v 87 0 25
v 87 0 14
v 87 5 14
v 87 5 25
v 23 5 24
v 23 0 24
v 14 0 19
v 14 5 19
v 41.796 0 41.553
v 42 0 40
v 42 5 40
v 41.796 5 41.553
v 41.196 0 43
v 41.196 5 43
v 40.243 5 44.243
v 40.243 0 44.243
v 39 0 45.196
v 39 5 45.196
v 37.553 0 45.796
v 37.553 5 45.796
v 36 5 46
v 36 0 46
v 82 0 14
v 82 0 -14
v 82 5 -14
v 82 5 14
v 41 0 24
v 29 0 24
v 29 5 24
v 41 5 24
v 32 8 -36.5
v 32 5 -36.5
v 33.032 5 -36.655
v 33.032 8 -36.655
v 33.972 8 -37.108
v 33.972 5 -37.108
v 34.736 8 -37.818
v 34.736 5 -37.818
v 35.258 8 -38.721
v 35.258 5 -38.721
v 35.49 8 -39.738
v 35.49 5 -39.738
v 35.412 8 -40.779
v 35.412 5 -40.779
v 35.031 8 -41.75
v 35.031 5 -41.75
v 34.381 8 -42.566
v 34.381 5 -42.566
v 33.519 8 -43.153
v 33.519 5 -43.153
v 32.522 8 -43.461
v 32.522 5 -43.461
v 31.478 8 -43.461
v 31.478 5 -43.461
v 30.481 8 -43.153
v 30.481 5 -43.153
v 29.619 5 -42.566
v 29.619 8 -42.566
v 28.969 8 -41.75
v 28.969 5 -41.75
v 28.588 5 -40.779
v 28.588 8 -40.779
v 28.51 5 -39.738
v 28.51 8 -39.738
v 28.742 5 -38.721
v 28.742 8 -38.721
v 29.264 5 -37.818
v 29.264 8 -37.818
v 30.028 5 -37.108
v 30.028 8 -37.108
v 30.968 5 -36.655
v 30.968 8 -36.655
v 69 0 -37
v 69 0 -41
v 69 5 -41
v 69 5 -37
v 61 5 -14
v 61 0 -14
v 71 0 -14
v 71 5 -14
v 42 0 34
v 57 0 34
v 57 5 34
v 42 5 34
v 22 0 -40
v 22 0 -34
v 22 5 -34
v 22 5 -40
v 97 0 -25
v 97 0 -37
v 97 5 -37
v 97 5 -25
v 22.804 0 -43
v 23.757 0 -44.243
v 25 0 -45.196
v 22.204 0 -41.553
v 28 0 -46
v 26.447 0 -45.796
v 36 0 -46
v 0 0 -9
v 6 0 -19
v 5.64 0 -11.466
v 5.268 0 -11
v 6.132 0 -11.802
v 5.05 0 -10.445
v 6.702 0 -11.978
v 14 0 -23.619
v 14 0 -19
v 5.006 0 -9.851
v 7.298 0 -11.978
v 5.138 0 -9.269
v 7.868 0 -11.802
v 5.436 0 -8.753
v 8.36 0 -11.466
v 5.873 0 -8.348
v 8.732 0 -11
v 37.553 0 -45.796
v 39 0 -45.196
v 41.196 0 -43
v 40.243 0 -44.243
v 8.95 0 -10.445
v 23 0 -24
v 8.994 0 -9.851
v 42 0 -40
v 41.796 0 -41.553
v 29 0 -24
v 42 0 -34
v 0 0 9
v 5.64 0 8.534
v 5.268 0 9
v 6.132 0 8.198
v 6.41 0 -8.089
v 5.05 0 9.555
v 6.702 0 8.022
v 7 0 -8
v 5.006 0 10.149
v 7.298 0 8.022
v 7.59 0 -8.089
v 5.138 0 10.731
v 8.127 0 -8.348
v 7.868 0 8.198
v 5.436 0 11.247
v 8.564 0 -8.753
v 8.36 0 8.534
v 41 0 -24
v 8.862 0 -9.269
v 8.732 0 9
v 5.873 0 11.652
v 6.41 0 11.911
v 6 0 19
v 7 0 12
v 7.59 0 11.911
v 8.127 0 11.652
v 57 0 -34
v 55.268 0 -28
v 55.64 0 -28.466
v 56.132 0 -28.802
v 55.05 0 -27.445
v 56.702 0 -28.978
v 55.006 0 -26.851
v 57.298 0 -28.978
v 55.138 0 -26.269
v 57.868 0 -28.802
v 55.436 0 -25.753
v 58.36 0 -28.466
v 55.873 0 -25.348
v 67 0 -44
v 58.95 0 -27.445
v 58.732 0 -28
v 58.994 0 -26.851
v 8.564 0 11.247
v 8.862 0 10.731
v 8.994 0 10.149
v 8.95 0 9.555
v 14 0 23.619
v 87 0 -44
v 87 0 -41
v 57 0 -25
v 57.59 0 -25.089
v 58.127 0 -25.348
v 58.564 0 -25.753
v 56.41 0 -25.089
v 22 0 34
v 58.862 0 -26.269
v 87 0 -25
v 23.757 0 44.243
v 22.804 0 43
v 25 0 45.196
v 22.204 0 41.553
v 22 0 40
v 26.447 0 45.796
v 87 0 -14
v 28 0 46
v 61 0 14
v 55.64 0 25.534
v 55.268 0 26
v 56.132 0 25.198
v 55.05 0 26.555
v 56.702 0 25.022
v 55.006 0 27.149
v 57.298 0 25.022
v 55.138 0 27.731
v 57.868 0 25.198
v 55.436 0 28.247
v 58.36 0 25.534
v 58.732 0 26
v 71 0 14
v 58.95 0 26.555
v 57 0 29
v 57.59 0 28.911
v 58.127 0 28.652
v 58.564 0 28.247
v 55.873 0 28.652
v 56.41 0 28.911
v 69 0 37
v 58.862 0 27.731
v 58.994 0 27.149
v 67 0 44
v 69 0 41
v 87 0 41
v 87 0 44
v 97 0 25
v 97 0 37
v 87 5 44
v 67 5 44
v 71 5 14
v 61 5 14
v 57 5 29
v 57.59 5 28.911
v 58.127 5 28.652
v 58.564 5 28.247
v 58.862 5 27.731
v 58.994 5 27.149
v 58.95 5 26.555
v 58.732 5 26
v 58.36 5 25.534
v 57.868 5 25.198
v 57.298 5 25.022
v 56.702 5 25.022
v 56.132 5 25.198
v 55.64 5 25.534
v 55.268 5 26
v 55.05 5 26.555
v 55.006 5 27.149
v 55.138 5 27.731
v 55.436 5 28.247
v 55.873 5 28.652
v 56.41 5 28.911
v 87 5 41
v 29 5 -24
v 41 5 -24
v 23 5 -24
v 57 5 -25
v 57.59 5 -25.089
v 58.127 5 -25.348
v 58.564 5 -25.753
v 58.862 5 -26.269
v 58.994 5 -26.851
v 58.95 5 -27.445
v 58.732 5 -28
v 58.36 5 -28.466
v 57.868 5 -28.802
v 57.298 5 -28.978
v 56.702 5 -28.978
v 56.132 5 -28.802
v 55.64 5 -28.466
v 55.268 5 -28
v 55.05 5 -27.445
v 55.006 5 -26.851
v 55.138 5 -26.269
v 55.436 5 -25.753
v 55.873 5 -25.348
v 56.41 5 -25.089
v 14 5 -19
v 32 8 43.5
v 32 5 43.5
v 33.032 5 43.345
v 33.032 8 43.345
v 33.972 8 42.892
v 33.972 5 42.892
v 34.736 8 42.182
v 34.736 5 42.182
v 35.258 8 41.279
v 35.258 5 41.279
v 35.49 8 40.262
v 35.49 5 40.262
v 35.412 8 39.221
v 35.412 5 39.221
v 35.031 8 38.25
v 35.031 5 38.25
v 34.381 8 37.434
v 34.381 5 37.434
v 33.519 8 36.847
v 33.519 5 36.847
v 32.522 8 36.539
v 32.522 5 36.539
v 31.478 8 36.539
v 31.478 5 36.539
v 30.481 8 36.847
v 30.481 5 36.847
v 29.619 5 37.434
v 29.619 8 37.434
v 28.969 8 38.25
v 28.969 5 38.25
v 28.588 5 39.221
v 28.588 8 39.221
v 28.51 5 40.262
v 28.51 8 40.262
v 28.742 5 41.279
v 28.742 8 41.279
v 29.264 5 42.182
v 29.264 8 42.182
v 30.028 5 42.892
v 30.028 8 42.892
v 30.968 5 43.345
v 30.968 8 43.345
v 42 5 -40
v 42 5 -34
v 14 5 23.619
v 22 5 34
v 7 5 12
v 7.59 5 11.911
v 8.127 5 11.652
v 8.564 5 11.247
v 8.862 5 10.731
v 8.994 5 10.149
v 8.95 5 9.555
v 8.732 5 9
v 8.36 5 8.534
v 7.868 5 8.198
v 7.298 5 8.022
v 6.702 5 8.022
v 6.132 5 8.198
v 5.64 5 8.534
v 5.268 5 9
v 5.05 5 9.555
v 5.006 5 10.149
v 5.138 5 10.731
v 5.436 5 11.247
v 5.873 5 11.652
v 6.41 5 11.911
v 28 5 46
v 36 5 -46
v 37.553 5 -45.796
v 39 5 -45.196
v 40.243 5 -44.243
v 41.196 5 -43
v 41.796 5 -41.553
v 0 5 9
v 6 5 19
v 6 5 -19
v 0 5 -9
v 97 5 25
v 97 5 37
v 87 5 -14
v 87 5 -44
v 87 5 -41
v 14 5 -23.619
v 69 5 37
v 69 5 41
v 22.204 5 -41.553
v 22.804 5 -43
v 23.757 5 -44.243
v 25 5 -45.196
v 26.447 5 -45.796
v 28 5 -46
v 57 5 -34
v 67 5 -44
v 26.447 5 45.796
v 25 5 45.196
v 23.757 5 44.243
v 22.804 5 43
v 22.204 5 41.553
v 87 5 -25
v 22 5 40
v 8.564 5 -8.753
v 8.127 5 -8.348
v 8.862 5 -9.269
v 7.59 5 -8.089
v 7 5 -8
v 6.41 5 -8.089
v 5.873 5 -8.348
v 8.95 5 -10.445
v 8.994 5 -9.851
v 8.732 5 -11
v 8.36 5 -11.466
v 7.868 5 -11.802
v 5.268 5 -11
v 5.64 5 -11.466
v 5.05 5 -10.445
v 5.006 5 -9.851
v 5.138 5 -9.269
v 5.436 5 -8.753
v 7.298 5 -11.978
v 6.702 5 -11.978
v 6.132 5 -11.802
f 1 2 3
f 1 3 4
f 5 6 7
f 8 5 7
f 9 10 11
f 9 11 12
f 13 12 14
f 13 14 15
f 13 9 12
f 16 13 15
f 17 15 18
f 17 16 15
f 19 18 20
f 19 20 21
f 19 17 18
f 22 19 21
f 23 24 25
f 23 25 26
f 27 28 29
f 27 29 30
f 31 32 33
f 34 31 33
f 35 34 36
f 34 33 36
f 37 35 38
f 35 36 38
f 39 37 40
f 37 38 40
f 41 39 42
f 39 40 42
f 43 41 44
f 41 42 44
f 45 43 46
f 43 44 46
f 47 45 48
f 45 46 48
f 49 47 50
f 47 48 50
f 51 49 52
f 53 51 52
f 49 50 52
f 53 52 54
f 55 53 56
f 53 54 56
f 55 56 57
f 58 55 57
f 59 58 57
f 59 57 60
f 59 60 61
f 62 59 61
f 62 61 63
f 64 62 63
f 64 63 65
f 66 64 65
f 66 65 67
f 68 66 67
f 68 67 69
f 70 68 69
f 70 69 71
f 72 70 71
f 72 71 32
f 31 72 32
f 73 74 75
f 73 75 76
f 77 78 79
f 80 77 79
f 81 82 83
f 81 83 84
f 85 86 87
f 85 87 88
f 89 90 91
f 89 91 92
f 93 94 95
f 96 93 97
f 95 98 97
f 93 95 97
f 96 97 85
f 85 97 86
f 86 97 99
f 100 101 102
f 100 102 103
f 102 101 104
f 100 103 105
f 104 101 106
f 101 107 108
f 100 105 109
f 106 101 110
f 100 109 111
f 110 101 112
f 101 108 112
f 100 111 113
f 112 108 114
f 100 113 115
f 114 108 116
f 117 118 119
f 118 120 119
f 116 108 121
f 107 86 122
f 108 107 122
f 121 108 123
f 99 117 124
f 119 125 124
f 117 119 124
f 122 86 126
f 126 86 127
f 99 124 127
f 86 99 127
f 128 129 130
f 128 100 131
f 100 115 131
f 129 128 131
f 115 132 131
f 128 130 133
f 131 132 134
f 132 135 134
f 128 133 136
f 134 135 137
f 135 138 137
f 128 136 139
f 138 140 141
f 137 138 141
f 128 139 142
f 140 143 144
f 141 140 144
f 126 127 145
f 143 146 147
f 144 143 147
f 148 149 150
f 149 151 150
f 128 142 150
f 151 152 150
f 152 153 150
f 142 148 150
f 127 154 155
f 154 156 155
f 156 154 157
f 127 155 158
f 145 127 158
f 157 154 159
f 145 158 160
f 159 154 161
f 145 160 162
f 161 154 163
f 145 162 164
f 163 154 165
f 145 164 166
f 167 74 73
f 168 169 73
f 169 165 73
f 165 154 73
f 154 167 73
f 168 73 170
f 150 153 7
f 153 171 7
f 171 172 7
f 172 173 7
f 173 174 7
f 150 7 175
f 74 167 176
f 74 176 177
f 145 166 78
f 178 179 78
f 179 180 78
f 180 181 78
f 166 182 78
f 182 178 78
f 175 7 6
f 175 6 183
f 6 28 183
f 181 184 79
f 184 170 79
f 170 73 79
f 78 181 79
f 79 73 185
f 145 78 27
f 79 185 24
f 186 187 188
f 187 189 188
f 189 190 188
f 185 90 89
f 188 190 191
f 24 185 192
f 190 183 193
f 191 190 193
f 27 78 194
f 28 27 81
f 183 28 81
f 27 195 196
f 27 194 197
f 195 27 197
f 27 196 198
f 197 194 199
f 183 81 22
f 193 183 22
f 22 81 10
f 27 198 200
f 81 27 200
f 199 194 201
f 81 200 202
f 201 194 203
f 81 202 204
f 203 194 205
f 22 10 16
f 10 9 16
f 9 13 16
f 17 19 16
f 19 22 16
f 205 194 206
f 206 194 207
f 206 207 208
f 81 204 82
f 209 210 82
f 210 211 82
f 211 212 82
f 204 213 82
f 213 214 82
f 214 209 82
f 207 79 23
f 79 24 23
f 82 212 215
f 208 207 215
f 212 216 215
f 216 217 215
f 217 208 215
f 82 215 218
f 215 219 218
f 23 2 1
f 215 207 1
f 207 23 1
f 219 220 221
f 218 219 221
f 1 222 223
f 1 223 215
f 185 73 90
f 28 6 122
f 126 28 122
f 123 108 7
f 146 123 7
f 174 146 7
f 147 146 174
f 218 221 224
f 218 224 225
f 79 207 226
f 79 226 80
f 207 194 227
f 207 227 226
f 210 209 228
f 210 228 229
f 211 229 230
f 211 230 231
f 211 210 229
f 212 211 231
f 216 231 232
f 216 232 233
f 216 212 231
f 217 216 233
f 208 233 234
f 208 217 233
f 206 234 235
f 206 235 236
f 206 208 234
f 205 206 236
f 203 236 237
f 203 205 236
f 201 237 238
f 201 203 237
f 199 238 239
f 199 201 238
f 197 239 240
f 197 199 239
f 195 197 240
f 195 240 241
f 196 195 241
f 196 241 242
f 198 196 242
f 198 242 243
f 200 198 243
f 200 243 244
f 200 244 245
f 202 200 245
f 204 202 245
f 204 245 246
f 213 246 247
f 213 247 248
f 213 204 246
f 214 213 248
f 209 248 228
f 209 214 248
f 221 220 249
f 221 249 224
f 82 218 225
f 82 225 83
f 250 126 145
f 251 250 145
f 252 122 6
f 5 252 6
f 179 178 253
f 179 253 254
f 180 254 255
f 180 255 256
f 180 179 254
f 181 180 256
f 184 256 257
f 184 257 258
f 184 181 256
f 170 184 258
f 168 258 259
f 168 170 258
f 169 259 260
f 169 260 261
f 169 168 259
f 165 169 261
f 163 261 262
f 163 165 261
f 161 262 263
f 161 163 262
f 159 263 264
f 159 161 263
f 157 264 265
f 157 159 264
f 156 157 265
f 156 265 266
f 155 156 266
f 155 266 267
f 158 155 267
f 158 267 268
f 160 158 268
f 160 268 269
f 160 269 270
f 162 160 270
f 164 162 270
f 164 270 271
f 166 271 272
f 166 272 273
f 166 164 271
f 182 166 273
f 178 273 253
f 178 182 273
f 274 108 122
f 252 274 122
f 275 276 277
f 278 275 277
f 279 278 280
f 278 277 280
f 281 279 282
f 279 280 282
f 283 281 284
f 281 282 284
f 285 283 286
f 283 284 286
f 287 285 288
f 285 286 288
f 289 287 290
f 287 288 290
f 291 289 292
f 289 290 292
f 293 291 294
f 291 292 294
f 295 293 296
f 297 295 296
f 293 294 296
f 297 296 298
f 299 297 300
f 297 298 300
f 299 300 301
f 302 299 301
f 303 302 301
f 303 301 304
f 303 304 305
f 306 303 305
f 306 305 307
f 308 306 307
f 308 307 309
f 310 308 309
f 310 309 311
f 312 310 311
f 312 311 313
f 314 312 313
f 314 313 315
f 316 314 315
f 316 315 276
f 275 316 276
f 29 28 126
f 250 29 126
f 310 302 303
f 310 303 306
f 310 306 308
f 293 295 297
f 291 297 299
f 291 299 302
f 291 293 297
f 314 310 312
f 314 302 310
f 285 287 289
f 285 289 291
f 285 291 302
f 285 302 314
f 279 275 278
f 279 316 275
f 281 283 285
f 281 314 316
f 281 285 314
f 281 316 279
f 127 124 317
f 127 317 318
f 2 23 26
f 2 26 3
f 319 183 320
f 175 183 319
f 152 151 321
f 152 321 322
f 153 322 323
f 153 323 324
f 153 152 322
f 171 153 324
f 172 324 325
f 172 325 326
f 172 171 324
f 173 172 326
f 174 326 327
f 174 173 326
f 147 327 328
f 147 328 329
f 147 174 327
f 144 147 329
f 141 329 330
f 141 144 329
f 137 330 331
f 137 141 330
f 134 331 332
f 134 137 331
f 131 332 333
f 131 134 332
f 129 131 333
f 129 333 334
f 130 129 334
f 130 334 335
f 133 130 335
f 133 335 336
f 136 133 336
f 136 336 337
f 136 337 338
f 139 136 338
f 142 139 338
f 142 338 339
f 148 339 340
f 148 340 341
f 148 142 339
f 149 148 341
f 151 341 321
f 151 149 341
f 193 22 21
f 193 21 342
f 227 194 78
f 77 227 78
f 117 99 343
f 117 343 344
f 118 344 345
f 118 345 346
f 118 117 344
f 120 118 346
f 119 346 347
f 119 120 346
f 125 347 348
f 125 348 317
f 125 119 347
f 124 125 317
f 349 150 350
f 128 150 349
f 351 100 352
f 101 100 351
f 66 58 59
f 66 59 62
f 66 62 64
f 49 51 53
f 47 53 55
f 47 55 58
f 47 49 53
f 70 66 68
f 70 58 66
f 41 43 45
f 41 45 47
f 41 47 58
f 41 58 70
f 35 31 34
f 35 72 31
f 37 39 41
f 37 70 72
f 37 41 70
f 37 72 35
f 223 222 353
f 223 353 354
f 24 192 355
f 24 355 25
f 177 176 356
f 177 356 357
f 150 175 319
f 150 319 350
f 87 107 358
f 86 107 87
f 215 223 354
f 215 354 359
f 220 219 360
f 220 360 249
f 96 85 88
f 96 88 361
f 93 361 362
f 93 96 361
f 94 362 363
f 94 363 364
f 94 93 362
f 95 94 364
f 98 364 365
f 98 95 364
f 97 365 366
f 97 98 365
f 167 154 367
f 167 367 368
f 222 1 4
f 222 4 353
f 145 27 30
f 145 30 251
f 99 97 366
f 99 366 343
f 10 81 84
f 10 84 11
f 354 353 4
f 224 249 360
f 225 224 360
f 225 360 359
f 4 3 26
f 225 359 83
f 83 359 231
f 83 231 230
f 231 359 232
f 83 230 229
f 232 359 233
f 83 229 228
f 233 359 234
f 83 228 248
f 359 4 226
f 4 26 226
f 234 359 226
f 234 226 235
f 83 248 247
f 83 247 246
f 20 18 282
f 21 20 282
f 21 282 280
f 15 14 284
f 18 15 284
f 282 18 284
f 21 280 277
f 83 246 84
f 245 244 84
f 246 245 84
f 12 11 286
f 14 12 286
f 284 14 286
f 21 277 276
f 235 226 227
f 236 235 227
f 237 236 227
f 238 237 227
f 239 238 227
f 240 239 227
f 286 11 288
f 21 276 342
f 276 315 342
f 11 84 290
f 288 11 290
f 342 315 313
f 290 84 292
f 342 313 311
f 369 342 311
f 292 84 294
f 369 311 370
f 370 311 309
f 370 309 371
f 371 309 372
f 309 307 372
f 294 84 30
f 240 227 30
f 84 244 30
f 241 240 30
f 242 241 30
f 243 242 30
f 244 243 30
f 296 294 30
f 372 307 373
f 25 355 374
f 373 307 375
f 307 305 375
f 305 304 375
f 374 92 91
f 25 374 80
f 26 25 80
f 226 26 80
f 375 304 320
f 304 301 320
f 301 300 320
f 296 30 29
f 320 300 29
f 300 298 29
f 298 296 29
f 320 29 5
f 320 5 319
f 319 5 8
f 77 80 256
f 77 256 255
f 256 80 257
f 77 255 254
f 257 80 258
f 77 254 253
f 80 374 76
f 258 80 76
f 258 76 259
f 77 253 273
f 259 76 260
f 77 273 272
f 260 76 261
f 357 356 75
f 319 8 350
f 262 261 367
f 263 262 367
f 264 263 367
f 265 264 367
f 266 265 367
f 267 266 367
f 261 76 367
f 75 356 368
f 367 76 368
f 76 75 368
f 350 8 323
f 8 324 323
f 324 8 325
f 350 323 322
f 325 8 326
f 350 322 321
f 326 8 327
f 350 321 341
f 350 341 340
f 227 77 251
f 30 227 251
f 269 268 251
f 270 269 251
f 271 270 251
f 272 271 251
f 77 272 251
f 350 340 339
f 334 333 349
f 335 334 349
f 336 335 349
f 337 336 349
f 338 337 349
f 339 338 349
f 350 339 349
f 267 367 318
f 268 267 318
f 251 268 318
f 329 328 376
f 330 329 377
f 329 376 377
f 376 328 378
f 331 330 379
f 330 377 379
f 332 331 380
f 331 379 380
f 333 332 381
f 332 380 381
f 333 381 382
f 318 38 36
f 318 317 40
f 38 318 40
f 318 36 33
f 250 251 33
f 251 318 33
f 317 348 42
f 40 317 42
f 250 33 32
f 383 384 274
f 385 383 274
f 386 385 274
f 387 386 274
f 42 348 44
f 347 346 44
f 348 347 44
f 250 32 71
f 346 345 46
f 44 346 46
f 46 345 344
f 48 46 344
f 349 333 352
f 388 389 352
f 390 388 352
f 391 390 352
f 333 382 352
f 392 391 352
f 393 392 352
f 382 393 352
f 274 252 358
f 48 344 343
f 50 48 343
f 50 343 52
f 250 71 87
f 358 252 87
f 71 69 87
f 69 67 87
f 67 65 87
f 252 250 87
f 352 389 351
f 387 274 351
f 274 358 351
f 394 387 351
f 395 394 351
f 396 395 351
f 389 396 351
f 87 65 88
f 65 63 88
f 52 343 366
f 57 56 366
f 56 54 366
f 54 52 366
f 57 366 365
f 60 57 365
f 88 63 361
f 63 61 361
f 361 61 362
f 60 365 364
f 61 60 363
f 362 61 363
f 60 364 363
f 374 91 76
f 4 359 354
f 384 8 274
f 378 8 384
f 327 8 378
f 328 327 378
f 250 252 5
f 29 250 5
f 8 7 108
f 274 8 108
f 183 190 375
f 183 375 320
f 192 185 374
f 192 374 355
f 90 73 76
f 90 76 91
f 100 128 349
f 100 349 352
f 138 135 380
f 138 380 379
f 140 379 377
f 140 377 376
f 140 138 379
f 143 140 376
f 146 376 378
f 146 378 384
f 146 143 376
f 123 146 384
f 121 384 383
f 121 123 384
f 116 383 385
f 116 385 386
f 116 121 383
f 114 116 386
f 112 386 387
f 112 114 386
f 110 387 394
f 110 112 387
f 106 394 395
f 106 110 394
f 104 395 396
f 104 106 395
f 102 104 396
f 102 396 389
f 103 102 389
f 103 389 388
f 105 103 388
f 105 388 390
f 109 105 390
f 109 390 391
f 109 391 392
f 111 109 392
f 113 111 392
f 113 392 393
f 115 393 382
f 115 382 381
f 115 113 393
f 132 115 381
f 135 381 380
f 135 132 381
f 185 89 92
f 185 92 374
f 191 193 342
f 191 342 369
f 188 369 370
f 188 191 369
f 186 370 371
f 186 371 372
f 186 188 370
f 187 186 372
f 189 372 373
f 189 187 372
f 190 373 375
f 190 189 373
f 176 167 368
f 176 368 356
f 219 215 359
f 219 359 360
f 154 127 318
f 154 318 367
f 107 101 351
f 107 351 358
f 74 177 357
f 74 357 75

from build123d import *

# Parameters (mm, degrees)
SKETCH1_R           = 2
SKETCH1_W           = 12
SKETCH1_H           = 48
SKETCH1_W_2         = 10
SKETCH1_H_2         = 28
BOSS_EXTRUDE1_DEPTH = 5
SKETCH1_3_R         = 3.5
BOSS_EXTRUDE2_DEPTH = 8


with BuildPart() as part:
    # Sketch1 → Boss-Extrude1 (new body)
    with BuildSketch(Plane(origin=(0, 0, 0), x_dir=(1, 0, 0), z_dir=(0, 1, 0))):
        with BuildLine():
            Line((0, 9), (0, -9))
            Line((0, -9), (6, -19))
            Line((6, -19), (14, -23.618802154))
            Line((14, -23.618802154), (22, -34))
            Line((22, -34), (22, -40))
            ThreePointArc((22, -40), (23.757359313, -44.242640687), (28, -46))
            Line((28, -46), (36, -46))
            ThreePointArc((36, -46), (40.242640687, -44.242640687), (42, -40))
            Line((42, -40), (42, -34))
            Line((42, -34), (57, -34))
            Line((57, -34), (67, -44))
            Line((67, -44), (87, -44))
            Line((87, -44), (87, -41))
            Line((87, -41), (69, -41))
            Line((69, -41), (69, -37))
            Line((69, -37), (97, -37))
            Line((97, -37), (97, -25))
            Line((97, -25), (87, -25))
            Line((87, -25), (87, -14))
            Line((87, -14), (82, -14))
            Line((82, -14), (82, 14))
            Line((82, 14), (87, 14))
            Line((87, 14), (87, 25))
            Line((87, 25), (97, 25))
            Line((97, 25), (97, 37))
            Line((97, 37), (69, 37))
            Line((69, 37), (69, 41))
            Line((69, 41), (87, 41))
            Line((87, 41), (87, 44))
            Line((87, 44), (67, 44))
            Line((67, 44), (57, 34))
            Line((57, 34), (42, 34))
            Line((42, 34), (42, 40))
            ThreePointArc((42, 40), (40.242640687, 44.242640687), (36, 46))
            Line((36, 46), (28, 46))
            ThreePointArc((28, 46), (23.757359313, 44.242640687), (22, 40))
            Line((22, 40), (22, 34))
            Line((22, 34), (14, 23.618802154))
            Line((14, 23.618802154), (6, 19))
            Line((6, 19), (0, 9))
        make_face()
        with Locations((7, -10)):
            Circle(SKETCH1_R, mode=Mode.SUBTRACT)
        with Locations((57, -27)):
            Circle(SKETCH1_R, mode=Mode.SUBTRACT)
        with Locations((7, 10)):
            Circle(SKETCH1_R, mode=Mode.SUBTRACT)
        Polygon((14, -19), (14, 19), (23, 24), (23, -24), align=None, mode=Mode.SUBTRACT)
        with Locations((35, 0)):
            Rectangle(SKETCH1_W, SKETCH1_H, mode=Mode.SUBTRACT)
        with Locations((66, 0)):
            Rectangle(SKETCH1_W_2, SKETCH1_H_2, mode=Mode.SUBTRACT)
        with Locations((57, 27)):
            Circle(SKETCH1_R, mode=Mode.SUBTRACT)
    extrude(amount=BOSS_EXTRUDE1_DEPTH)

    # Sketch1<3> → Boss-Extrude2 (add)
    with BuildSketch(Plane(origin=(0, 0, 0), x_dir=(1, 0, 0), z_dir=(0, 1, 0))):
        with Locations((32, -40)):
            Circle(SKETCH1_3_R)
        with Locations((32, 40)):
            Circle(SKETCH1_3_R)
    extrude(amount=BOSS_EXTRUDE2_DEPTH)


solid = part.part
